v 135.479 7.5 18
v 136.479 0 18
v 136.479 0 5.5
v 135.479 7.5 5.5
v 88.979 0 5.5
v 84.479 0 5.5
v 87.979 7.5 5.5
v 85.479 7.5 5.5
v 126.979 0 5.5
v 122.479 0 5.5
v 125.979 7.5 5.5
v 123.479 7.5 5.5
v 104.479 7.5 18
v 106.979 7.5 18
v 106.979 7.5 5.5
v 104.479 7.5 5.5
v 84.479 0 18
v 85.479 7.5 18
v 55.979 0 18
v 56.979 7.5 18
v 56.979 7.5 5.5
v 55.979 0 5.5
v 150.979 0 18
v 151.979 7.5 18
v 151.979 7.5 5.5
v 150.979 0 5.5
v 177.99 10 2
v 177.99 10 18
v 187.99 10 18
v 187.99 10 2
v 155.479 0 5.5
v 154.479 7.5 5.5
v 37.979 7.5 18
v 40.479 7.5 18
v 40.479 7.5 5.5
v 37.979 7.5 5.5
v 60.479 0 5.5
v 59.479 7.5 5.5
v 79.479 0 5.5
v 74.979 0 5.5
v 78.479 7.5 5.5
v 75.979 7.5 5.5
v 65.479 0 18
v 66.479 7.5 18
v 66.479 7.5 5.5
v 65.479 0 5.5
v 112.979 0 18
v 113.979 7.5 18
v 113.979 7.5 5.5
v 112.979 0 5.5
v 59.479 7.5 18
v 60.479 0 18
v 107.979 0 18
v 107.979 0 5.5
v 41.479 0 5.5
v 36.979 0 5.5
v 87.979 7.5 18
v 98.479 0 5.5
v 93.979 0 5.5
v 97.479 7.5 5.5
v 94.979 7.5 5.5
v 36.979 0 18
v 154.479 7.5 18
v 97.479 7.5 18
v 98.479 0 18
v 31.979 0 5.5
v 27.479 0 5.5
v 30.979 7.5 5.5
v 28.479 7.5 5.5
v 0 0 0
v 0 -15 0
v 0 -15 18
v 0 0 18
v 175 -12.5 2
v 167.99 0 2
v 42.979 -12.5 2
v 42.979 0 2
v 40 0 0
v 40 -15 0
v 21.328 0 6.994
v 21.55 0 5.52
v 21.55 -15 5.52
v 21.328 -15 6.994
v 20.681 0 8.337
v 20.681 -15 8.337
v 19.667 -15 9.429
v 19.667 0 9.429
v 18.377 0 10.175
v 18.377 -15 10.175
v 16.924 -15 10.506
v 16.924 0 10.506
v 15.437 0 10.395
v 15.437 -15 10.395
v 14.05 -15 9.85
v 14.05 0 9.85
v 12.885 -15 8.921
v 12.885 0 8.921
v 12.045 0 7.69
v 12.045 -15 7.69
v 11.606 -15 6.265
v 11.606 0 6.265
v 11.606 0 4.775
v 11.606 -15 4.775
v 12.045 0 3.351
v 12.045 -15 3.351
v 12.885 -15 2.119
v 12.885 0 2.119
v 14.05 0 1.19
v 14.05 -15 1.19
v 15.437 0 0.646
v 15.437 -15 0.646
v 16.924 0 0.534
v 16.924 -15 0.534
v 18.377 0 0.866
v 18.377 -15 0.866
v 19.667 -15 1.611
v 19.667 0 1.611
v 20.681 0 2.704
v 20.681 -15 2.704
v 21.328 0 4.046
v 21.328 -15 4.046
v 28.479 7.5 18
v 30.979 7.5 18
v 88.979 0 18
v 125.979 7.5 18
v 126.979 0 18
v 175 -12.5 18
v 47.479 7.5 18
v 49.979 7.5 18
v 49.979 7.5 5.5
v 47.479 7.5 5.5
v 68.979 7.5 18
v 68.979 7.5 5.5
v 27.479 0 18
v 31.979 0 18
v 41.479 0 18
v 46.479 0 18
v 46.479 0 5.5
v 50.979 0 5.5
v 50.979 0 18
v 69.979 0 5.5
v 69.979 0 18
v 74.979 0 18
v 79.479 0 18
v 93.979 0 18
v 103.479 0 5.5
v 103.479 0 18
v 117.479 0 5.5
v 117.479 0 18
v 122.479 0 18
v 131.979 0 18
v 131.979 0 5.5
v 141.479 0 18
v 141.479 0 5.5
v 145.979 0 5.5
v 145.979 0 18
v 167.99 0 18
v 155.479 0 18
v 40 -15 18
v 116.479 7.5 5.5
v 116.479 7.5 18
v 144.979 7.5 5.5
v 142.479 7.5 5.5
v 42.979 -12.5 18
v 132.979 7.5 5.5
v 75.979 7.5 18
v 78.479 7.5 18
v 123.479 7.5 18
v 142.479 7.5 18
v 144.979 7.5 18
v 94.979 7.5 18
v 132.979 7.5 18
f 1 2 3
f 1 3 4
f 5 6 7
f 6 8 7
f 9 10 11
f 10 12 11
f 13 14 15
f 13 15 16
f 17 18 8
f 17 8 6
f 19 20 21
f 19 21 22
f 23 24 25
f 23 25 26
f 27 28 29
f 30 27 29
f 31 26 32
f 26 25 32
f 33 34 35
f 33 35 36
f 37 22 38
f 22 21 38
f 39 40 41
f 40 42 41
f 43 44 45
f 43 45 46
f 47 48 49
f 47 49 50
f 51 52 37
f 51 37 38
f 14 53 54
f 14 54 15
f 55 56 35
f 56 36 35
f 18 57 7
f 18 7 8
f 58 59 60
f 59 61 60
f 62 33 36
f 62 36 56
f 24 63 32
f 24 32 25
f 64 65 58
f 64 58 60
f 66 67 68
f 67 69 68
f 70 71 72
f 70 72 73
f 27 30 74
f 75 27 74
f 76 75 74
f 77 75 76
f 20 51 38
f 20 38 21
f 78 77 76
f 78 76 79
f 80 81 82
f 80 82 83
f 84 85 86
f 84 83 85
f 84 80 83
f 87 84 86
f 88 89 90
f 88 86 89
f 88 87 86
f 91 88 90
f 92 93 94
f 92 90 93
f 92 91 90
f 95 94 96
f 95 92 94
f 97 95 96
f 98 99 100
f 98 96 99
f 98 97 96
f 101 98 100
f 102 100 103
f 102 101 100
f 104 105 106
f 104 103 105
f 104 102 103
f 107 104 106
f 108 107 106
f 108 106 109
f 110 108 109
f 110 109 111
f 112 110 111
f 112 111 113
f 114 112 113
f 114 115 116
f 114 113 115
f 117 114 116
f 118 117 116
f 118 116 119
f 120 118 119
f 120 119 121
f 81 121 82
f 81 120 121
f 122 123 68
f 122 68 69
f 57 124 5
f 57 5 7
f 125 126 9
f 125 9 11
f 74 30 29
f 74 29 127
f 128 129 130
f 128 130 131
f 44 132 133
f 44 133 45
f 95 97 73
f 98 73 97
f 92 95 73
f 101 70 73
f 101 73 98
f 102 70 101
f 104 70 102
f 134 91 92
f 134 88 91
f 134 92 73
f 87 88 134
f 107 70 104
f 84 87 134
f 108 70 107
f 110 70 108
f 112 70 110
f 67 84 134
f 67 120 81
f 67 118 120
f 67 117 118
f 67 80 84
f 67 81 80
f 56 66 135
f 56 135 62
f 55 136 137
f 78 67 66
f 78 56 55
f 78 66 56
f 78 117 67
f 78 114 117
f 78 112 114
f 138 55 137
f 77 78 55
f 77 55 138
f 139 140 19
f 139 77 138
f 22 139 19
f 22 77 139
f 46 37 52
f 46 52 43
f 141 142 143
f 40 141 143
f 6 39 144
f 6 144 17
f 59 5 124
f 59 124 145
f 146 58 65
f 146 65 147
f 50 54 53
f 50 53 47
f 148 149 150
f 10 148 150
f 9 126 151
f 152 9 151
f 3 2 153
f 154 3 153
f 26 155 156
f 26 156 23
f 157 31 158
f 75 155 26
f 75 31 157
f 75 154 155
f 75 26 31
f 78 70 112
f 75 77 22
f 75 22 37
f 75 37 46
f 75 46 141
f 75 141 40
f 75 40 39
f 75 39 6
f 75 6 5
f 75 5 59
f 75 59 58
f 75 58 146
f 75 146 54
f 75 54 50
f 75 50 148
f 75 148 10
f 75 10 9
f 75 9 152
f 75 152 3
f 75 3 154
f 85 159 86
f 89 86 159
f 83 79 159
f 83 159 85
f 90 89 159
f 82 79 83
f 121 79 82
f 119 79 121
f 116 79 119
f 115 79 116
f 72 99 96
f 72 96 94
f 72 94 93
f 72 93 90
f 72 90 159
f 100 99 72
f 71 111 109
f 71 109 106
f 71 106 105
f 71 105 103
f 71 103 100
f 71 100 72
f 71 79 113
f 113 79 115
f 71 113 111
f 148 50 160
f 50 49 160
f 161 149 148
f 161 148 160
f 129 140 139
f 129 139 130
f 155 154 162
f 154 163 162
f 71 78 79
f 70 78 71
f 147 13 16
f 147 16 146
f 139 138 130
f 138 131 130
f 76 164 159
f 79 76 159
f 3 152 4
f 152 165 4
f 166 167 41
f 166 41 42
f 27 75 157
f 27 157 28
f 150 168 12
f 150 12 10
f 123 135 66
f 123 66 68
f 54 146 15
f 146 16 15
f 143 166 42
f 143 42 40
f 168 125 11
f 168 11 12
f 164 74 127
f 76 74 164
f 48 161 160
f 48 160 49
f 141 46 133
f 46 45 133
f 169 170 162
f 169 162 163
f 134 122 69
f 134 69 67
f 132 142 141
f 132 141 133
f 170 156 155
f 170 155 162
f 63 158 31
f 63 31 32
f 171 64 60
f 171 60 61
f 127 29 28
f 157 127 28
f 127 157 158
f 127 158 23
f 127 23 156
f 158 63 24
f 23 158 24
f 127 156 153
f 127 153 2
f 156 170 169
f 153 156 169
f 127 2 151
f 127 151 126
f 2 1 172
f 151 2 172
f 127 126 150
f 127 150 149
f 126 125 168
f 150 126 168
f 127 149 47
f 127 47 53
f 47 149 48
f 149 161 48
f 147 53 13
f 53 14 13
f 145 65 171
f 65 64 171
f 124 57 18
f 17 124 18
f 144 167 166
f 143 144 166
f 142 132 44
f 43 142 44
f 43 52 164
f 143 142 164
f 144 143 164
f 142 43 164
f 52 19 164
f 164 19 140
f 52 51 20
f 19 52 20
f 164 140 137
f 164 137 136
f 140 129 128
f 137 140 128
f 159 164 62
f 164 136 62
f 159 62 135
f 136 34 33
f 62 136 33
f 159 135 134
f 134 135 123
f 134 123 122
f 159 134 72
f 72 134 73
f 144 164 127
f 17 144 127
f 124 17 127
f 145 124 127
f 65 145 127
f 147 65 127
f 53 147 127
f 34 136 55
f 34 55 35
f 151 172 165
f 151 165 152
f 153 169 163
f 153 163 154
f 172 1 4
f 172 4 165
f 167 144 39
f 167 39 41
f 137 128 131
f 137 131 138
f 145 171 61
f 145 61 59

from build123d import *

# Parameters (mm, degrees)
BOSS_EXTRUDE1_DEPTH     = 18
CUT_EXTRUDE3_START      = 10
CUT_EXTRUDE3_DEPTH      = 200.444934928
BOSS_EXTRUDE2_DEPTH     = 12.5
LPATTERN1_COUNT         = 12
LPATTERN1_PITCH         = 9.5
LPATTERN1_COL_COUNT     = 3
LPATTERN1_COL_PITCH     = 9.5
CUT_EXTRUDE2_DEPTH      = 191.497725367
CUT_EXTRUDE2_DEPTH_BACK = 191.497725367
SKETCH5_R               = 5


with BuildPart() as part:
    # Sketch1 → Boss-Extrude1 (new body)
    with BuildSketch(Plane.XY):
        Polygon((0, 0), (167.990381057, 0), (177.990381057, 10), (187.990381057, 10), (175, -12.5), (42.979383981, -12.5), (40, -15), (0, -15), align=None)
    extrude(amount=BOSS_EXTRUDE1_DEPTH)

    # Sketch6 → Cut-Extrude3 (cut, through all)
    with BuildSketch(Plane(origin=(0, 0, 0), x_dir=(1, 0, 0), z_dir=(0, 1, 0)).offset(CUT_EXTRUDE3_START)):
        Polygon((187.990381057, 0), (187.990381057, -2), (42.979383981, -2), (40, 0), align=None)
    extrude(amount=-CUT_EXTRUDE3_DEPTH, mode=Mode.SUBTRACT)

    # Sketch3 → Boss-Extrude2 (add)
    with BuildSketch(Plane.XY.offset(18)):
        Polygon((46.479383981, 0), (50.979383981, 0), (49.979383981, 7.5), (47.479383981, 7.5), align=None)
    boss_extrude2 = extrude(amount=-BOSS_EXTRUDE2_DEPTH)

    # LPattern1: Boss-Extrude2 ×12
    with Locations(*[(i * LPATTERN1_PITCH, 0, 0) for i in range(1, LPATTERN1_COUNT)]):
        add(boss_extrude2)

    # LPattern1 col: Boss-Extrude2 ×3
    with Locations(*[(-i * LPATTERN1_COL_PITCH, 0, 0) for i in range(1, LPATTERN1_COL_COUNT)]):
        add(boss_extrude2)

    # Sketch5 → Cut-Extrude2 (cut, two sides: drawn at the far end of the back side and taken through both)
    with BuildSketch(Plane.XZ.offset(15).offset(-CUT_EXTRUDE2_DEPTH_BACK)):
        with Locations((16.55, 5.52014012)):
            Circle(SKETCH5_R)
    extrude(amount=CUT_EXTRUDE2_DEPTH + CUT_EXTRUDE2_DEPTH_BACK, mode=Mode.SUBTRACT)


solid = part.part
